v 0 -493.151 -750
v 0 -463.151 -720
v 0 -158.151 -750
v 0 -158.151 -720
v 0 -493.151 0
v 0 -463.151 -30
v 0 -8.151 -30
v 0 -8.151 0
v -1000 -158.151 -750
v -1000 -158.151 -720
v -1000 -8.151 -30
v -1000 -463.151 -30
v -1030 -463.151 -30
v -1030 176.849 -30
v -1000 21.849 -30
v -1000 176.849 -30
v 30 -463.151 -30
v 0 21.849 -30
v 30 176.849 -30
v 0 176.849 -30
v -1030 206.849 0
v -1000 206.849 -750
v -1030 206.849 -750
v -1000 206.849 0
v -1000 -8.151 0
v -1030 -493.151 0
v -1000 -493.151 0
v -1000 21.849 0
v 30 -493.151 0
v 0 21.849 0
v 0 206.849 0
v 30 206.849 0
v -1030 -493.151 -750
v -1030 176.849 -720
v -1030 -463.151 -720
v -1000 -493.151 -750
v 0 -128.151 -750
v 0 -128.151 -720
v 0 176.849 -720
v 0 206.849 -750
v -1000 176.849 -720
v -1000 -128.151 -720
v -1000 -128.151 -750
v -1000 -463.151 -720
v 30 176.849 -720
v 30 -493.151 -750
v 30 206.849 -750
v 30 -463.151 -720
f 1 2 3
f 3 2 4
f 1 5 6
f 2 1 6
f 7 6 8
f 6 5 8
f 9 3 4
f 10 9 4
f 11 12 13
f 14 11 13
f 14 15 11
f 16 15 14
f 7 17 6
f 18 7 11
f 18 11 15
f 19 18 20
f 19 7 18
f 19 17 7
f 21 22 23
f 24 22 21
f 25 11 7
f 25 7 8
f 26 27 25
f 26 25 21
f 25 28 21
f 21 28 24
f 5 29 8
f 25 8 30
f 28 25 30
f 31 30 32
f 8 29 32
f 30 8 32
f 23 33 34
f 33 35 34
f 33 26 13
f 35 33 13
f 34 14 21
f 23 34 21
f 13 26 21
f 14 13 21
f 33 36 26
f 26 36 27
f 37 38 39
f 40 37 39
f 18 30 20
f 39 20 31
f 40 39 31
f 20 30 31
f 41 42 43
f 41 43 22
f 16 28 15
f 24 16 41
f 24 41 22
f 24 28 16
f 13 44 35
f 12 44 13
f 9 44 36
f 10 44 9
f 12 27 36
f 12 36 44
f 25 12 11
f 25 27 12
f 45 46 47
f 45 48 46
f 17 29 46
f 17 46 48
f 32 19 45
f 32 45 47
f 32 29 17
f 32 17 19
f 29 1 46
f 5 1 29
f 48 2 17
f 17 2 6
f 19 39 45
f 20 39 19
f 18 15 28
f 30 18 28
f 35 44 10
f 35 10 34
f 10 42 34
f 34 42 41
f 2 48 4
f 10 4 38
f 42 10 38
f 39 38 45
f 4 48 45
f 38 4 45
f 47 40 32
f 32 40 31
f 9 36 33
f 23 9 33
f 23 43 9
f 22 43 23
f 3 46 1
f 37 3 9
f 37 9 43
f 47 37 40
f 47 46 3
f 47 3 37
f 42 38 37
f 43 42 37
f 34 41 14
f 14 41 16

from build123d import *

# Parameters (mm, degrees)
F0_W     = 700
F0_H     = 750
F0_W_2   = 640
F0_H_2   = 690
F1_DEPTH = 30
F2_W     = 30
F2_H     = 30
F3_DEPTH = 500
F6_DEPTH = 1000


with BuildPart() as f1:
    # F0 (on Right) → F1 (new body)
    with BuildSketch(Plane.YZ):
        with Locations((-143.150666, -375)):
            Rectangle(F0_W, F0_H)
        with Locations((-143.150666, -375)):
            Rectangle(F0_W_2, F0_H_2, mode=Mode.SUBTRACT)
    extrude(amount=F1_DEPTH)

    # F2 (on face) → F3 (join)
    with BuildSketch(Plane(origin=(0, 0, 0), x_dir=(0, -1, 0), z_dir=(-1, 0, 0))):
        with Locations((-6.849334, -15)):
            Rectangle(F2_W, F2_H)
    extrude(amount=F3_DEPTH)

    # F4: F1 across face


with BuildPart() as f1_1:
    add(f1.part)
    add(f1.part.mirror(Plane(origin=(-500, 6.849334, -15), x_dir=(0, -1, 0), z_dir=(-1, 0, 0))))

    # F5 (on face) → F6 (join, through all)
    with BuildSketch(Plane(origin=(0, 0, 0), x_dir=(0, -1, 0), z_dir=(-1, 0, 0))):
        Polygon((128.150666, -750), (143.150666, -750), (158.150666, -750), (158.150666, -720), (128.150666, -720), align=None)
    extrude(amount=F6_DEPTH)


solid = f1_1.part
